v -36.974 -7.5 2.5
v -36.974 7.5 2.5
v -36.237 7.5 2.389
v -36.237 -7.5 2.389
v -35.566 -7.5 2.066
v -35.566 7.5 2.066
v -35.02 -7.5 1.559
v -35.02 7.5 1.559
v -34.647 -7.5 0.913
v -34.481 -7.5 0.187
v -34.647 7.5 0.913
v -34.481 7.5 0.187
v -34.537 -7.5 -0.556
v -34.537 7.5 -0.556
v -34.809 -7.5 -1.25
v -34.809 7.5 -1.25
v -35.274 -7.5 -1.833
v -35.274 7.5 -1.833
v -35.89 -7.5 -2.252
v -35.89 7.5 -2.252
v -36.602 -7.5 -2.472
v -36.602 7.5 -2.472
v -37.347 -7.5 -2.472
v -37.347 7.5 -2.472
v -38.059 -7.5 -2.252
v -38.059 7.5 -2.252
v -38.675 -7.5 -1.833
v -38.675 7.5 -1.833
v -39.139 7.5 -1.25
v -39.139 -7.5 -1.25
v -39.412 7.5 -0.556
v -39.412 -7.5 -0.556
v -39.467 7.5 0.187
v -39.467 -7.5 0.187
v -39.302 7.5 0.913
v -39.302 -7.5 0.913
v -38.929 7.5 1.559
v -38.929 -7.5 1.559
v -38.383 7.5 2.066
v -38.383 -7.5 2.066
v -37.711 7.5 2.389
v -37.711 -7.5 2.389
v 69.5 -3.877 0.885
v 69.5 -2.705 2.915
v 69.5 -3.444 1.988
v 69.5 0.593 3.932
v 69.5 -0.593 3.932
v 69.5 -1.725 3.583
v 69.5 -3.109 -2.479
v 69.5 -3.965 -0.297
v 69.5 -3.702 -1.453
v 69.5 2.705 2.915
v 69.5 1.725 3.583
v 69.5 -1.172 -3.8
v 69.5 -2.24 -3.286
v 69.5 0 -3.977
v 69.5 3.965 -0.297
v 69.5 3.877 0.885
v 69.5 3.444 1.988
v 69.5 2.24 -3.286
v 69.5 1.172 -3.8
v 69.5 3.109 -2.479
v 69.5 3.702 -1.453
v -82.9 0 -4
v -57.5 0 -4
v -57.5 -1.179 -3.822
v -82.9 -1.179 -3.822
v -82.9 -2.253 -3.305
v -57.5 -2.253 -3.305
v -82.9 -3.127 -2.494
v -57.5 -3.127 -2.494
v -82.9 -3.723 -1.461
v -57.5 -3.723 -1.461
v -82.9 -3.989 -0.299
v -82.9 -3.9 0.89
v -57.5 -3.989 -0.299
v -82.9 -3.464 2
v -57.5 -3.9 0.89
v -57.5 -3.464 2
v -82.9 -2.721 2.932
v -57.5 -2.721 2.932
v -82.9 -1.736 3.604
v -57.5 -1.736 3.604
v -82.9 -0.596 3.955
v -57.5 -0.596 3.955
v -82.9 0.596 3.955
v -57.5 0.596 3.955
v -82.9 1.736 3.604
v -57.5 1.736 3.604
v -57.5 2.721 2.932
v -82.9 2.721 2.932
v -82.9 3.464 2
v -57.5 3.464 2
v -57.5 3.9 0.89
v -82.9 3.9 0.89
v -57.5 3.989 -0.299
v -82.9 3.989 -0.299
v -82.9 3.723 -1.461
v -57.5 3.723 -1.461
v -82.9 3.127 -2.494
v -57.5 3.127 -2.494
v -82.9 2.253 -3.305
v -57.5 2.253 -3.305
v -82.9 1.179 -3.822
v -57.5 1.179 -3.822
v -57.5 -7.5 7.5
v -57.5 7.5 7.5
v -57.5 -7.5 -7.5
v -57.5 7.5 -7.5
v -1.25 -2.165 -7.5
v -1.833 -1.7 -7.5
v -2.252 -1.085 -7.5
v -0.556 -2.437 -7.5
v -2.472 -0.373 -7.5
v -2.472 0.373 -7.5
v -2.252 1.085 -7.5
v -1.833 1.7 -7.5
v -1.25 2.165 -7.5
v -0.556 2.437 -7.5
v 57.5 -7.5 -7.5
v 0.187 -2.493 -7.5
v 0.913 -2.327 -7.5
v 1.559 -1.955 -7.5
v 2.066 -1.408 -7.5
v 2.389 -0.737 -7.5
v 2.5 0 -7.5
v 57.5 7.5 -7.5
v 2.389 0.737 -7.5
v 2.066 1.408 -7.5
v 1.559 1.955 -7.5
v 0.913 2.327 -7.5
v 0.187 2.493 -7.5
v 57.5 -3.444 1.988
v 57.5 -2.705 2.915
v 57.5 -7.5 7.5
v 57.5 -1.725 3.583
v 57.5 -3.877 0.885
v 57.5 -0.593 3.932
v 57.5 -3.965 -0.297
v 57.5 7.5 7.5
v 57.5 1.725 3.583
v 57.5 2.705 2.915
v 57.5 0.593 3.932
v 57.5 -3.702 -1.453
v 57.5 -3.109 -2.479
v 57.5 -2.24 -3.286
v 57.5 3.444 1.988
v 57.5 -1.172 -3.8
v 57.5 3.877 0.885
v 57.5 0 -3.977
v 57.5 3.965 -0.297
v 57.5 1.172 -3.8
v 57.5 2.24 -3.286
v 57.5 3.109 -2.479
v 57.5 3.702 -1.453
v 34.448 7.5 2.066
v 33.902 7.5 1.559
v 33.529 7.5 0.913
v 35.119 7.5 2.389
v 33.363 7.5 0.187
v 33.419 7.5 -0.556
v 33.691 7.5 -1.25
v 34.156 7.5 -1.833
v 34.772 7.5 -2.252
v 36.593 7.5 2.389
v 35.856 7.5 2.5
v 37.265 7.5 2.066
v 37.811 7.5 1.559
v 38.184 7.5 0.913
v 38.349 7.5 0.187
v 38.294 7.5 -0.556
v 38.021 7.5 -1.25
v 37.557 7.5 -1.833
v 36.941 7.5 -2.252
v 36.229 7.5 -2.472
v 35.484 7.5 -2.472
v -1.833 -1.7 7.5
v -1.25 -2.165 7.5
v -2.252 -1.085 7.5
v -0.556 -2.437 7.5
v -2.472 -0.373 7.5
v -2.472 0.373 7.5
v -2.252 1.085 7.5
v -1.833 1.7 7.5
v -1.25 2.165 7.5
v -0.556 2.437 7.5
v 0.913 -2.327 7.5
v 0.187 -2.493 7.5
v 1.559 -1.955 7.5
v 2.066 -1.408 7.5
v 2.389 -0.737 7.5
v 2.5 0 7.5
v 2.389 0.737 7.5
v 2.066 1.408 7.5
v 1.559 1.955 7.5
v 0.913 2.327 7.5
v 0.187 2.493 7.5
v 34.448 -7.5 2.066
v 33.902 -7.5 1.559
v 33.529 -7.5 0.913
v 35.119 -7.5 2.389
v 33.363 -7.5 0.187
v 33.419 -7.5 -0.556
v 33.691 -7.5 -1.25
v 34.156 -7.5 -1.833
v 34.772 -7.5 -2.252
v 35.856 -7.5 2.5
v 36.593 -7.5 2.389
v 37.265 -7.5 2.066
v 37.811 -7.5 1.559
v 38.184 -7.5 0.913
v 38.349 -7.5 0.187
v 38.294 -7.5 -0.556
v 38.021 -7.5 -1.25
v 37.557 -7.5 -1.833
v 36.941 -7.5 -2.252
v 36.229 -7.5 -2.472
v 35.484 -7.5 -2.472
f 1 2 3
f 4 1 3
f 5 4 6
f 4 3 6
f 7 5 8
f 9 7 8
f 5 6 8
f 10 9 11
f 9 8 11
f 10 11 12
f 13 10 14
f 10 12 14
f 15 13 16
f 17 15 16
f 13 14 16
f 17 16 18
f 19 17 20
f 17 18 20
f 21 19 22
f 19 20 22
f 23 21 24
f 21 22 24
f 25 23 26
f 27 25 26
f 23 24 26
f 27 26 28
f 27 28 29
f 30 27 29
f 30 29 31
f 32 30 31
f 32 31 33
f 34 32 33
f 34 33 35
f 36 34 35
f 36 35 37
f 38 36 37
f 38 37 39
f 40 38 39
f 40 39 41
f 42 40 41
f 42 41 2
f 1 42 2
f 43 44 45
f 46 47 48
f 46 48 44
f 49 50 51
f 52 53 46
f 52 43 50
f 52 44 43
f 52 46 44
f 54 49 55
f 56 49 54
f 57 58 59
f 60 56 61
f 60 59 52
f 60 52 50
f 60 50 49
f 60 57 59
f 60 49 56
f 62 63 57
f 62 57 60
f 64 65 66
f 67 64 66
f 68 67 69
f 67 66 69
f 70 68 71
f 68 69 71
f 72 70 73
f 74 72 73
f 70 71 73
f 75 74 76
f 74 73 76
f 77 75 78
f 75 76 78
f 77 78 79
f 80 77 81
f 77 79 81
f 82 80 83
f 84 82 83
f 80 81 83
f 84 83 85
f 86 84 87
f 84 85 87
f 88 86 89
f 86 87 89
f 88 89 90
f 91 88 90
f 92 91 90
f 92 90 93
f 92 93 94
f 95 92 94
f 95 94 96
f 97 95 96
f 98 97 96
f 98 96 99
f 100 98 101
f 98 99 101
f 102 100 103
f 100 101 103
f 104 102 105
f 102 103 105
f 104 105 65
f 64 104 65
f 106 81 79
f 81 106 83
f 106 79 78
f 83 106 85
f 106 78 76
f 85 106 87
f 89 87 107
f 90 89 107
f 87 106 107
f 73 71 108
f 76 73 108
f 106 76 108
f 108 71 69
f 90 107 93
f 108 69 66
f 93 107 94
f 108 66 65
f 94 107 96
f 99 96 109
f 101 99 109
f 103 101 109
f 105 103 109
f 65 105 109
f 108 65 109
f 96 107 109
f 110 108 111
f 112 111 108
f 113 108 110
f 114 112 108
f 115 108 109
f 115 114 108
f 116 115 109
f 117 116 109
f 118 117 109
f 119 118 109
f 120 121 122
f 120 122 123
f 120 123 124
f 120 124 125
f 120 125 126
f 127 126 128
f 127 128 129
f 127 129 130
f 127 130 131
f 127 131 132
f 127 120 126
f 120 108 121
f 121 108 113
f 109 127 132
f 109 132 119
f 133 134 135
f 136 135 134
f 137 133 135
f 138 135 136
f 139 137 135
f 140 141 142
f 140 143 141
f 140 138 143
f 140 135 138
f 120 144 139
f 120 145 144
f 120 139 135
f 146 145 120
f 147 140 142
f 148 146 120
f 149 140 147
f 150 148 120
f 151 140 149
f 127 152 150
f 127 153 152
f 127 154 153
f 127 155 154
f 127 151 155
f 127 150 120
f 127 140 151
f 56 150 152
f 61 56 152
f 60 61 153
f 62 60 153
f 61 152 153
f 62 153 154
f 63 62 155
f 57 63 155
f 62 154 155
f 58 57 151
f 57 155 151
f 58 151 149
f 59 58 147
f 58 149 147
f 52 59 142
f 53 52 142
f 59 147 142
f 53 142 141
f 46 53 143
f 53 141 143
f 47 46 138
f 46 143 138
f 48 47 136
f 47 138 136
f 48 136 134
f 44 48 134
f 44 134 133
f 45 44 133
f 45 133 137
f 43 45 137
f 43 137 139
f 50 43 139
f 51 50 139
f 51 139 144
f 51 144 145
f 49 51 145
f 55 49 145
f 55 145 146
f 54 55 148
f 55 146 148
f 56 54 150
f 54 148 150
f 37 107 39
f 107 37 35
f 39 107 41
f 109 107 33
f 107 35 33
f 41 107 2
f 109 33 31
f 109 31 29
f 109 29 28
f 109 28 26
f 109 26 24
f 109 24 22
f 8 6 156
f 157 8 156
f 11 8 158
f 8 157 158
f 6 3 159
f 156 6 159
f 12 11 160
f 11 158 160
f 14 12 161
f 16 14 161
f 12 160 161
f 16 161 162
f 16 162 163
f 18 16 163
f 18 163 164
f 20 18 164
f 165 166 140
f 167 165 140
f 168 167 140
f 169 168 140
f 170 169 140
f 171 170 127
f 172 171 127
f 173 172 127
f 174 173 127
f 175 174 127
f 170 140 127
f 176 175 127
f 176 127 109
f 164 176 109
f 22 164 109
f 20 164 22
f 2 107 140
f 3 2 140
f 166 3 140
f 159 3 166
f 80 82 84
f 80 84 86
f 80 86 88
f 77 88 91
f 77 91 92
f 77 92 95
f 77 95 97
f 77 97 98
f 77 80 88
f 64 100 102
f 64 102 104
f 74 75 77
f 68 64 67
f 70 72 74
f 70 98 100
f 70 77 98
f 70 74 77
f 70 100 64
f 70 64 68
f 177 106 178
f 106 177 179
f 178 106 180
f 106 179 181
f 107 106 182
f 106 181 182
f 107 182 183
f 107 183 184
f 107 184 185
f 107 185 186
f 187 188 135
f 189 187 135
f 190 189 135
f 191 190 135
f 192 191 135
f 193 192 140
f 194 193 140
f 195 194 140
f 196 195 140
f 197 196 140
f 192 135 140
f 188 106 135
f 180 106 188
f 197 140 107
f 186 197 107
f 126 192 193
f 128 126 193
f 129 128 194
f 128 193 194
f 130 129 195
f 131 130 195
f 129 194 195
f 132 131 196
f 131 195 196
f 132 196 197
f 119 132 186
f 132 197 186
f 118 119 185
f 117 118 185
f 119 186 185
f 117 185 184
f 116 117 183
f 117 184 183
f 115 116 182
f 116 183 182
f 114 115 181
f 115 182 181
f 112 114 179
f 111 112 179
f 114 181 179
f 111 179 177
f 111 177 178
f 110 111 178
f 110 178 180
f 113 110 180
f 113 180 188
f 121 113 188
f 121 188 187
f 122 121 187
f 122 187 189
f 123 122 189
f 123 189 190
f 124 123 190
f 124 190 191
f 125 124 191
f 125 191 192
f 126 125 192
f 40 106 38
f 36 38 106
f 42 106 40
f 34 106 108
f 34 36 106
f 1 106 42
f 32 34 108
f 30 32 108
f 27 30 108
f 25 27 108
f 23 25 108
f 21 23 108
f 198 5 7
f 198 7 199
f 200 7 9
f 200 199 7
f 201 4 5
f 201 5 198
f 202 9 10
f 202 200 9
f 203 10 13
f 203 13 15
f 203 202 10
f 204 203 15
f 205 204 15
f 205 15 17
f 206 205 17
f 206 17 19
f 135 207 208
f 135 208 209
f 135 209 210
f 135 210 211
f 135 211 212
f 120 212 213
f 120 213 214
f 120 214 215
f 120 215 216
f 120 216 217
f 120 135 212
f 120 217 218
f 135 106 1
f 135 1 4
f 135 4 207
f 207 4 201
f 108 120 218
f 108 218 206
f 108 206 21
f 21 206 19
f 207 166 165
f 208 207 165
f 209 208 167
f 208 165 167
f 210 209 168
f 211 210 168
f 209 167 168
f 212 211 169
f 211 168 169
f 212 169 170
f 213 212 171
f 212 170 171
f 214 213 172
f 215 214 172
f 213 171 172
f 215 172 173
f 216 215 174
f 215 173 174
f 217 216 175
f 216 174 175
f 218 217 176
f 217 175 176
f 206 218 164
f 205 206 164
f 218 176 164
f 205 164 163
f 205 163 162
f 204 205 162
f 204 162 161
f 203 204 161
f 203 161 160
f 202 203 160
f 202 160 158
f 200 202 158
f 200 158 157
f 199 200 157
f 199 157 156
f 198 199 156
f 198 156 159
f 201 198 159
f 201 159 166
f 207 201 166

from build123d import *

# Parameters (mm, degrees)
CROQUIS1_W              = 15
CROQUIS1_H              = 15
SALIENTE_EXTRUIR1_DEPTH = 57.5
CROQUIS2_R              = 2.5
CORTAR_EXTRUIR1_DEPTH   = 60.895742754
CROQUIS3_R              = 2.5
CORTAR_EXTRUIR2_DEPTH   = 60.895742754
CROQUIS4_R              = 4
SALIENTE_EXTRUIR2_DEPTH = 25.4
CROQUIS5_R              = 3.976569184
SALIENTE_EXTRUIR3_DEPTH = 12


with BuildPart() as part:
    # Croquis1 → Saliente-Extruir1 (new, symmetric)
    with BuildSketch(Plane(origin=(0, 0, 0), x_dir=(0, 0, -1), z_dir=(1, 0, 0))):
        Rectangle(CROQUIS1_W, CROQUIS1_H)
    extrude(amount=SALIENTE_EXTRUIR1_DEPTH, both=True)

    # Croquis2 → Cortar-Extruir1 (cut, through all)
    with BuildSketch(Plane.XY.offset(7.5)):
        Circle(CROQUIS2_R)
    extrude(amount=-CORTAR_EXTRUIR1_DEPTH, mode=Mode.SUBTRACT)

    # Croquis3 → Cortar-Extruir2 (cut, through all)
    with BuildSketch(Plane(origin=(0, 7.5, 0), x_dir=(1, 0, 0), z_dir=(0, 1, 0))):
        with Locations(Location((-36.974332256, 0, 0), (0, 0, 270))):
            Circle(CROQUIS3_R)
        with Locations(Location((35.85631789, 0, 0), (0, 0, 270))):
            Circle(CROQUIS3_R)
    extrude(amount=-CORTAR_EXTRUIR2_DEPTH, mode=Mode.SUBTRACT)

    # Croquis4 → Saliente-Extruir2 (add)
    with BuildSketch(Plane.ZY.offset(57.5)):
        with Locations(Location((0, 0, 0), (0, 0, 180))):
            Circle(CROQUIS4_R)
    extrude(amount=SALIENTE_EXTRUIR2_DEPTH)

    # Croquis5 → Saliente-Extruir3 (add)
    with BuildSketch(Plane(origin=(57.5, 0, 0), x_dir=(0, 0, -1), z_dir=(1, 0, 0))):
        Circle(CROQUIS5_R)
    extrude(amount=SALIENTE_EXTRUIR3_DEPTH)


solid = part.part
